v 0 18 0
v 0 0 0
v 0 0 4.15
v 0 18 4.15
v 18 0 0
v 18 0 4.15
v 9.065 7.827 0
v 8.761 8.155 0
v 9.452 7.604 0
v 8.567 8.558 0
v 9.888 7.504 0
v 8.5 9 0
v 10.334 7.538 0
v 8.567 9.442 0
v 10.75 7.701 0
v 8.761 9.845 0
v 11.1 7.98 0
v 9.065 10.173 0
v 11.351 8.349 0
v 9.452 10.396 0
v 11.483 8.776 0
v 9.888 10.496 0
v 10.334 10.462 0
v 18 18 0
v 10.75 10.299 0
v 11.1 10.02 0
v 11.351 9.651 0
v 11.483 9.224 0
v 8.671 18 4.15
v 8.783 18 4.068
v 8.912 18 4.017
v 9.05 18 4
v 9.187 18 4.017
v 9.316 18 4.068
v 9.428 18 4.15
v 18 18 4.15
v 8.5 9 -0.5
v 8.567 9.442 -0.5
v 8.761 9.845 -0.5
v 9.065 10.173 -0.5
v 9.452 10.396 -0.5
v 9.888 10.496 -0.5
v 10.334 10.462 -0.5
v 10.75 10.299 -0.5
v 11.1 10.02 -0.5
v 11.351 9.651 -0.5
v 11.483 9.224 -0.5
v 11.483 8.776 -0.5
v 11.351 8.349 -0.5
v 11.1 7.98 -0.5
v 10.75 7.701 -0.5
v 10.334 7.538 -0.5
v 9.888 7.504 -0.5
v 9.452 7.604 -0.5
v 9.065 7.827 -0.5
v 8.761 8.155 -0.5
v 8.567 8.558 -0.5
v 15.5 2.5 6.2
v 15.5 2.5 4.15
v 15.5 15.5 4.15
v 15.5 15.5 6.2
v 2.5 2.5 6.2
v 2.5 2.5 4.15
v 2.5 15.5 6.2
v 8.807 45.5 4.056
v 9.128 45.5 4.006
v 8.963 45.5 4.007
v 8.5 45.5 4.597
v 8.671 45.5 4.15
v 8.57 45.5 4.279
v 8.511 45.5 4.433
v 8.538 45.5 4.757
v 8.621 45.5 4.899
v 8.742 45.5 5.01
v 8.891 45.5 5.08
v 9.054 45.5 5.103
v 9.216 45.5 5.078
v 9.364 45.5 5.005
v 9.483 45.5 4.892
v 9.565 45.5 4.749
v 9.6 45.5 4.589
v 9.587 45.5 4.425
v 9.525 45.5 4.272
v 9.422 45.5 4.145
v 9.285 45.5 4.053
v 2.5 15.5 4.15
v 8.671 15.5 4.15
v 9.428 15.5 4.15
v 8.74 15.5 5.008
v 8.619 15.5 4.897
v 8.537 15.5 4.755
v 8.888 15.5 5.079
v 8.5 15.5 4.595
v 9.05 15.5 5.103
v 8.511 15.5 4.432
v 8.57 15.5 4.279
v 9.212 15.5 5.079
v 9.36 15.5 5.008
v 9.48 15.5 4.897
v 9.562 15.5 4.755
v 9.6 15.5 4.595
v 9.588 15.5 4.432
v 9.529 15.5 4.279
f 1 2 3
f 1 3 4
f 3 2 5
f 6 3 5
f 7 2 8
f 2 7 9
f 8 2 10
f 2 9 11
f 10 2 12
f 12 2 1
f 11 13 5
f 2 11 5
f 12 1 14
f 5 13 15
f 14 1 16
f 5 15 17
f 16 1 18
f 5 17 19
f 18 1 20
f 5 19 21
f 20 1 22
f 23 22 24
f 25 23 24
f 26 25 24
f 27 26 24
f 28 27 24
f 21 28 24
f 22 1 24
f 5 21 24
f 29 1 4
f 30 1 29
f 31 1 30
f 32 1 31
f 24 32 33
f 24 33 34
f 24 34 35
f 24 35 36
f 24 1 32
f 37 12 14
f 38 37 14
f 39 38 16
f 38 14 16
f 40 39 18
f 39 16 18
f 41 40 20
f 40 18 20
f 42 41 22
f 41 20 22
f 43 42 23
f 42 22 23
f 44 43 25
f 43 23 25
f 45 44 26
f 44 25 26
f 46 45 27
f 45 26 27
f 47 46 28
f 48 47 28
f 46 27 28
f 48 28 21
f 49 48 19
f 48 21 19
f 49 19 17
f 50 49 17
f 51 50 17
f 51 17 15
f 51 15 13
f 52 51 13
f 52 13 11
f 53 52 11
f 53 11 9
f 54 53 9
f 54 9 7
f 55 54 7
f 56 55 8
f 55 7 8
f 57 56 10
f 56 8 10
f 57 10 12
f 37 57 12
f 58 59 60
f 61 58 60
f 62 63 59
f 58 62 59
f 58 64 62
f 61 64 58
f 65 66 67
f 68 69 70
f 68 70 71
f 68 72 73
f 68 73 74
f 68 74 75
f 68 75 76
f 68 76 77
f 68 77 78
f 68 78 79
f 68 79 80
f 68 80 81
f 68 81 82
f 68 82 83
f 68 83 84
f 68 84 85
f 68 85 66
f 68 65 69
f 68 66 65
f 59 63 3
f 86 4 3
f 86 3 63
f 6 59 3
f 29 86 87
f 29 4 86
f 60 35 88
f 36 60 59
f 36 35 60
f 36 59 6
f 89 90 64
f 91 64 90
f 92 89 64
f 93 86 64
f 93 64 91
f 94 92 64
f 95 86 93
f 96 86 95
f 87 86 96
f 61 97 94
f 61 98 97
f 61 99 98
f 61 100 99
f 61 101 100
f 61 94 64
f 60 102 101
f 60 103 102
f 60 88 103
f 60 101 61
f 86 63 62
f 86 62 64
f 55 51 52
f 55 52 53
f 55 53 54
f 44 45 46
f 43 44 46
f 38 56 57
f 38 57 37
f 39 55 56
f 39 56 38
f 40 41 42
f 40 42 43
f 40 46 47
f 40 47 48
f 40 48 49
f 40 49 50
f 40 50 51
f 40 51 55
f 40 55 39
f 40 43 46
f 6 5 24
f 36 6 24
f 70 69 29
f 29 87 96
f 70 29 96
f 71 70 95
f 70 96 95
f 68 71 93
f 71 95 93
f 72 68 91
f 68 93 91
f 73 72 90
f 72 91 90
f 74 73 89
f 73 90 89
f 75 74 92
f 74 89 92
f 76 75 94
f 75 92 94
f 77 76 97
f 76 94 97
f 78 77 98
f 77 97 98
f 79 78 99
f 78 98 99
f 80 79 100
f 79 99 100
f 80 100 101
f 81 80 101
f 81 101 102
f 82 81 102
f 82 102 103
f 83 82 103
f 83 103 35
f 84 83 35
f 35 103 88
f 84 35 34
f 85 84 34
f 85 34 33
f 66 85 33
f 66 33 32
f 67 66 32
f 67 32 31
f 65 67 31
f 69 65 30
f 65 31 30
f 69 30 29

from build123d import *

# Parameters (mm, degrees)
SKETCH1_W           = 18
SKETCH1_H           = 18
BOSS_EXTRUDE1_DEPTH = 4.15
SKETCH2_W           = 13
SKETCH2_H           = 13
BOSS_EXTRUDE2_DEPTH = 2.05
SKETCH3_R           = 1.5
BOSS_EXTRUDE3_DEPTH = 0.5
SKETCH4_R           = 0.551632399
BOSS_EXTRUDE4_DEPTH = 30


with BuildPart() as part:
    # Sketch1 → Boss-Extrude1 (new body)
    with BuildSketch(Plane.XY):
        with Locations((9, 9)):
            Rectangle(SKETCH1_W, SKETCH1_H)
    extrude(amount=BOSS_EXTRUDE1_DEPTH)

    # Sketch2 → Boss-Extrude2 (add)
    with BuildSketch(Plane.XY.offset(4.15)):
        with Locations((9, 9)):
            Rectangle(SKETCH2_W, SKETCH2_H)
    extrude(amount=BOSS_EXTRUDE2_DEPTH)

    # Sketch3 → Boss-Extrude3 (add)
    with BuildSketch(Plane(origin=(0, 0, 0), x_dir=(-1, 0, 0), z_dir=(0, 0, -1))):
        with Locations((-10, 9)):
            Circle(SKETCH3_R)
    extrude(amount=BOSS_EXTRUDE3_DEPTH)

    # Sketch4 → Boss-Extrude4 (add)
    with BuildSketch(Plane(origin=(0, 15.5, 0), x_dir=(1, 0, 0), z_dir=(0, 1, 0))):
        with Locations(Location((9.049626603, -4.551632399, 0), (0, 0, 133.274343649))):
            Circle(SKETCH4_R)
    extrude(amount=BOSS_EXTRUDE4_DEPTH)


solid = part.part
